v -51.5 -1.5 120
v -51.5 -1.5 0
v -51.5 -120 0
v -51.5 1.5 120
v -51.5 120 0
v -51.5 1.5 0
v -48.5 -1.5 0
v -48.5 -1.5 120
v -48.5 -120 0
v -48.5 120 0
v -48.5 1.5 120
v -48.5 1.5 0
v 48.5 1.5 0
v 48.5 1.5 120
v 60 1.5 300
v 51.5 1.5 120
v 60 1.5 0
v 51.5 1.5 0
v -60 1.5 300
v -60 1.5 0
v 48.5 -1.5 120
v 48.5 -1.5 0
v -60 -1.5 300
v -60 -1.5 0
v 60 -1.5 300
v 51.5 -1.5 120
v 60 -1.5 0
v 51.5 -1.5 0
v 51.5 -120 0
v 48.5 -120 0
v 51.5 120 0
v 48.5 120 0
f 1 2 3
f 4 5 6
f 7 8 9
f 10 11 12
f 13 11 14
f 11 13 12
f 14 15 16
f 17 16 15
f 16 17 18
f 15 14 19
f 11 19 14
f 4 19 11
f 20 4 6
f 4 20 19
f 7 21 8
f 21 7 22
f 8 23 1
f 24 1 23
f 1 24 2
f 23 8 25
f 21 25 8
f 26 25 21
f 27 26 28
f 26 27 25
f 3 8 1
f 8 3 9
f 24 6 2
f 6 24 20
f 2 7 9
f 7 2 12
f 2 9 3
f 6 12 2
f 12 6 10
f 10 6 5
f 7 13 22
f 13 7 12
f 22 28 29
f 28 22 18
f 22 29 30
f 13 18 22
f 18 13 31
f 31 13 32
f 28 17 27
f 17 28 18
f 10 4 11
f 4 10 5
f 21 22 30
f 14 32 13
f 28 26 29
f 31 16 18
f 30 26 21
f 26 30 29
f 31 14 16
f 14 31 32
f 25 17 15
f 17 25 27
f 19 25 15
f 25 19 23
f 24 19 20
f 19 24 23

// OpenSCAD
// file: body.scad
include <config.scad>;

module body()
{
    difference()
    {
        // Main plate
        translate([
            0,
            0,
            body_height/2
            ])
        cube([
            body_width,
            material_z,
            body_height
            ], center=true);

        translate([
            +foot_sideshift,
            0,
            foot_z/4 - nothing
            ])
        cube([
            material_z,
            material_z + 2*nothing,
            foot_z/2
            ], center=true);

        translate([
            -foot_sideshift,
            0,
            foot_z/4 - nothing
            ])
        cube([
            material_z,
            material_z + 2*nothing,
            foot_z/2
            ], center=true);
    }
}

body();
// file: foot.scad
include <config.scad>;

module foot()
{
    rotate([90, 0, 90])
    linear_extrude(material_z, center=true)
    //difference()
    {
        polygon([
            [-foot_x, 0],
            [+foot_x, 0],
            [+material_z/2, +foot_z],
            [+material_z/2, +foot_z/2],
            [-material_z/2, +foot_z/2],
            [-material_z/2, +foot_z]
            ], center=true);
/*        
#        translate([
#            120,
#            120
#            ])
#        circle(r=120);
        */
    }
}

foot();
// file: config.scad
$fn = 50;
nothing = 0.01;

material_z = 3;

body_width = 120;
body_height = 300;

foot_x = 120;
foot_z = 120;
foot_sideshift = 50;
// main file
include <config.scad>;
use <foot.scad>;
use <body.scad>;

module model()
{
    color("green")
    {
    translate([-foot_sideshift, 0, 0])
    foot();

    translate([+foot_sideshift, 0, 0])
    foot();
    }

    color("blue")
    body();
}

model();
